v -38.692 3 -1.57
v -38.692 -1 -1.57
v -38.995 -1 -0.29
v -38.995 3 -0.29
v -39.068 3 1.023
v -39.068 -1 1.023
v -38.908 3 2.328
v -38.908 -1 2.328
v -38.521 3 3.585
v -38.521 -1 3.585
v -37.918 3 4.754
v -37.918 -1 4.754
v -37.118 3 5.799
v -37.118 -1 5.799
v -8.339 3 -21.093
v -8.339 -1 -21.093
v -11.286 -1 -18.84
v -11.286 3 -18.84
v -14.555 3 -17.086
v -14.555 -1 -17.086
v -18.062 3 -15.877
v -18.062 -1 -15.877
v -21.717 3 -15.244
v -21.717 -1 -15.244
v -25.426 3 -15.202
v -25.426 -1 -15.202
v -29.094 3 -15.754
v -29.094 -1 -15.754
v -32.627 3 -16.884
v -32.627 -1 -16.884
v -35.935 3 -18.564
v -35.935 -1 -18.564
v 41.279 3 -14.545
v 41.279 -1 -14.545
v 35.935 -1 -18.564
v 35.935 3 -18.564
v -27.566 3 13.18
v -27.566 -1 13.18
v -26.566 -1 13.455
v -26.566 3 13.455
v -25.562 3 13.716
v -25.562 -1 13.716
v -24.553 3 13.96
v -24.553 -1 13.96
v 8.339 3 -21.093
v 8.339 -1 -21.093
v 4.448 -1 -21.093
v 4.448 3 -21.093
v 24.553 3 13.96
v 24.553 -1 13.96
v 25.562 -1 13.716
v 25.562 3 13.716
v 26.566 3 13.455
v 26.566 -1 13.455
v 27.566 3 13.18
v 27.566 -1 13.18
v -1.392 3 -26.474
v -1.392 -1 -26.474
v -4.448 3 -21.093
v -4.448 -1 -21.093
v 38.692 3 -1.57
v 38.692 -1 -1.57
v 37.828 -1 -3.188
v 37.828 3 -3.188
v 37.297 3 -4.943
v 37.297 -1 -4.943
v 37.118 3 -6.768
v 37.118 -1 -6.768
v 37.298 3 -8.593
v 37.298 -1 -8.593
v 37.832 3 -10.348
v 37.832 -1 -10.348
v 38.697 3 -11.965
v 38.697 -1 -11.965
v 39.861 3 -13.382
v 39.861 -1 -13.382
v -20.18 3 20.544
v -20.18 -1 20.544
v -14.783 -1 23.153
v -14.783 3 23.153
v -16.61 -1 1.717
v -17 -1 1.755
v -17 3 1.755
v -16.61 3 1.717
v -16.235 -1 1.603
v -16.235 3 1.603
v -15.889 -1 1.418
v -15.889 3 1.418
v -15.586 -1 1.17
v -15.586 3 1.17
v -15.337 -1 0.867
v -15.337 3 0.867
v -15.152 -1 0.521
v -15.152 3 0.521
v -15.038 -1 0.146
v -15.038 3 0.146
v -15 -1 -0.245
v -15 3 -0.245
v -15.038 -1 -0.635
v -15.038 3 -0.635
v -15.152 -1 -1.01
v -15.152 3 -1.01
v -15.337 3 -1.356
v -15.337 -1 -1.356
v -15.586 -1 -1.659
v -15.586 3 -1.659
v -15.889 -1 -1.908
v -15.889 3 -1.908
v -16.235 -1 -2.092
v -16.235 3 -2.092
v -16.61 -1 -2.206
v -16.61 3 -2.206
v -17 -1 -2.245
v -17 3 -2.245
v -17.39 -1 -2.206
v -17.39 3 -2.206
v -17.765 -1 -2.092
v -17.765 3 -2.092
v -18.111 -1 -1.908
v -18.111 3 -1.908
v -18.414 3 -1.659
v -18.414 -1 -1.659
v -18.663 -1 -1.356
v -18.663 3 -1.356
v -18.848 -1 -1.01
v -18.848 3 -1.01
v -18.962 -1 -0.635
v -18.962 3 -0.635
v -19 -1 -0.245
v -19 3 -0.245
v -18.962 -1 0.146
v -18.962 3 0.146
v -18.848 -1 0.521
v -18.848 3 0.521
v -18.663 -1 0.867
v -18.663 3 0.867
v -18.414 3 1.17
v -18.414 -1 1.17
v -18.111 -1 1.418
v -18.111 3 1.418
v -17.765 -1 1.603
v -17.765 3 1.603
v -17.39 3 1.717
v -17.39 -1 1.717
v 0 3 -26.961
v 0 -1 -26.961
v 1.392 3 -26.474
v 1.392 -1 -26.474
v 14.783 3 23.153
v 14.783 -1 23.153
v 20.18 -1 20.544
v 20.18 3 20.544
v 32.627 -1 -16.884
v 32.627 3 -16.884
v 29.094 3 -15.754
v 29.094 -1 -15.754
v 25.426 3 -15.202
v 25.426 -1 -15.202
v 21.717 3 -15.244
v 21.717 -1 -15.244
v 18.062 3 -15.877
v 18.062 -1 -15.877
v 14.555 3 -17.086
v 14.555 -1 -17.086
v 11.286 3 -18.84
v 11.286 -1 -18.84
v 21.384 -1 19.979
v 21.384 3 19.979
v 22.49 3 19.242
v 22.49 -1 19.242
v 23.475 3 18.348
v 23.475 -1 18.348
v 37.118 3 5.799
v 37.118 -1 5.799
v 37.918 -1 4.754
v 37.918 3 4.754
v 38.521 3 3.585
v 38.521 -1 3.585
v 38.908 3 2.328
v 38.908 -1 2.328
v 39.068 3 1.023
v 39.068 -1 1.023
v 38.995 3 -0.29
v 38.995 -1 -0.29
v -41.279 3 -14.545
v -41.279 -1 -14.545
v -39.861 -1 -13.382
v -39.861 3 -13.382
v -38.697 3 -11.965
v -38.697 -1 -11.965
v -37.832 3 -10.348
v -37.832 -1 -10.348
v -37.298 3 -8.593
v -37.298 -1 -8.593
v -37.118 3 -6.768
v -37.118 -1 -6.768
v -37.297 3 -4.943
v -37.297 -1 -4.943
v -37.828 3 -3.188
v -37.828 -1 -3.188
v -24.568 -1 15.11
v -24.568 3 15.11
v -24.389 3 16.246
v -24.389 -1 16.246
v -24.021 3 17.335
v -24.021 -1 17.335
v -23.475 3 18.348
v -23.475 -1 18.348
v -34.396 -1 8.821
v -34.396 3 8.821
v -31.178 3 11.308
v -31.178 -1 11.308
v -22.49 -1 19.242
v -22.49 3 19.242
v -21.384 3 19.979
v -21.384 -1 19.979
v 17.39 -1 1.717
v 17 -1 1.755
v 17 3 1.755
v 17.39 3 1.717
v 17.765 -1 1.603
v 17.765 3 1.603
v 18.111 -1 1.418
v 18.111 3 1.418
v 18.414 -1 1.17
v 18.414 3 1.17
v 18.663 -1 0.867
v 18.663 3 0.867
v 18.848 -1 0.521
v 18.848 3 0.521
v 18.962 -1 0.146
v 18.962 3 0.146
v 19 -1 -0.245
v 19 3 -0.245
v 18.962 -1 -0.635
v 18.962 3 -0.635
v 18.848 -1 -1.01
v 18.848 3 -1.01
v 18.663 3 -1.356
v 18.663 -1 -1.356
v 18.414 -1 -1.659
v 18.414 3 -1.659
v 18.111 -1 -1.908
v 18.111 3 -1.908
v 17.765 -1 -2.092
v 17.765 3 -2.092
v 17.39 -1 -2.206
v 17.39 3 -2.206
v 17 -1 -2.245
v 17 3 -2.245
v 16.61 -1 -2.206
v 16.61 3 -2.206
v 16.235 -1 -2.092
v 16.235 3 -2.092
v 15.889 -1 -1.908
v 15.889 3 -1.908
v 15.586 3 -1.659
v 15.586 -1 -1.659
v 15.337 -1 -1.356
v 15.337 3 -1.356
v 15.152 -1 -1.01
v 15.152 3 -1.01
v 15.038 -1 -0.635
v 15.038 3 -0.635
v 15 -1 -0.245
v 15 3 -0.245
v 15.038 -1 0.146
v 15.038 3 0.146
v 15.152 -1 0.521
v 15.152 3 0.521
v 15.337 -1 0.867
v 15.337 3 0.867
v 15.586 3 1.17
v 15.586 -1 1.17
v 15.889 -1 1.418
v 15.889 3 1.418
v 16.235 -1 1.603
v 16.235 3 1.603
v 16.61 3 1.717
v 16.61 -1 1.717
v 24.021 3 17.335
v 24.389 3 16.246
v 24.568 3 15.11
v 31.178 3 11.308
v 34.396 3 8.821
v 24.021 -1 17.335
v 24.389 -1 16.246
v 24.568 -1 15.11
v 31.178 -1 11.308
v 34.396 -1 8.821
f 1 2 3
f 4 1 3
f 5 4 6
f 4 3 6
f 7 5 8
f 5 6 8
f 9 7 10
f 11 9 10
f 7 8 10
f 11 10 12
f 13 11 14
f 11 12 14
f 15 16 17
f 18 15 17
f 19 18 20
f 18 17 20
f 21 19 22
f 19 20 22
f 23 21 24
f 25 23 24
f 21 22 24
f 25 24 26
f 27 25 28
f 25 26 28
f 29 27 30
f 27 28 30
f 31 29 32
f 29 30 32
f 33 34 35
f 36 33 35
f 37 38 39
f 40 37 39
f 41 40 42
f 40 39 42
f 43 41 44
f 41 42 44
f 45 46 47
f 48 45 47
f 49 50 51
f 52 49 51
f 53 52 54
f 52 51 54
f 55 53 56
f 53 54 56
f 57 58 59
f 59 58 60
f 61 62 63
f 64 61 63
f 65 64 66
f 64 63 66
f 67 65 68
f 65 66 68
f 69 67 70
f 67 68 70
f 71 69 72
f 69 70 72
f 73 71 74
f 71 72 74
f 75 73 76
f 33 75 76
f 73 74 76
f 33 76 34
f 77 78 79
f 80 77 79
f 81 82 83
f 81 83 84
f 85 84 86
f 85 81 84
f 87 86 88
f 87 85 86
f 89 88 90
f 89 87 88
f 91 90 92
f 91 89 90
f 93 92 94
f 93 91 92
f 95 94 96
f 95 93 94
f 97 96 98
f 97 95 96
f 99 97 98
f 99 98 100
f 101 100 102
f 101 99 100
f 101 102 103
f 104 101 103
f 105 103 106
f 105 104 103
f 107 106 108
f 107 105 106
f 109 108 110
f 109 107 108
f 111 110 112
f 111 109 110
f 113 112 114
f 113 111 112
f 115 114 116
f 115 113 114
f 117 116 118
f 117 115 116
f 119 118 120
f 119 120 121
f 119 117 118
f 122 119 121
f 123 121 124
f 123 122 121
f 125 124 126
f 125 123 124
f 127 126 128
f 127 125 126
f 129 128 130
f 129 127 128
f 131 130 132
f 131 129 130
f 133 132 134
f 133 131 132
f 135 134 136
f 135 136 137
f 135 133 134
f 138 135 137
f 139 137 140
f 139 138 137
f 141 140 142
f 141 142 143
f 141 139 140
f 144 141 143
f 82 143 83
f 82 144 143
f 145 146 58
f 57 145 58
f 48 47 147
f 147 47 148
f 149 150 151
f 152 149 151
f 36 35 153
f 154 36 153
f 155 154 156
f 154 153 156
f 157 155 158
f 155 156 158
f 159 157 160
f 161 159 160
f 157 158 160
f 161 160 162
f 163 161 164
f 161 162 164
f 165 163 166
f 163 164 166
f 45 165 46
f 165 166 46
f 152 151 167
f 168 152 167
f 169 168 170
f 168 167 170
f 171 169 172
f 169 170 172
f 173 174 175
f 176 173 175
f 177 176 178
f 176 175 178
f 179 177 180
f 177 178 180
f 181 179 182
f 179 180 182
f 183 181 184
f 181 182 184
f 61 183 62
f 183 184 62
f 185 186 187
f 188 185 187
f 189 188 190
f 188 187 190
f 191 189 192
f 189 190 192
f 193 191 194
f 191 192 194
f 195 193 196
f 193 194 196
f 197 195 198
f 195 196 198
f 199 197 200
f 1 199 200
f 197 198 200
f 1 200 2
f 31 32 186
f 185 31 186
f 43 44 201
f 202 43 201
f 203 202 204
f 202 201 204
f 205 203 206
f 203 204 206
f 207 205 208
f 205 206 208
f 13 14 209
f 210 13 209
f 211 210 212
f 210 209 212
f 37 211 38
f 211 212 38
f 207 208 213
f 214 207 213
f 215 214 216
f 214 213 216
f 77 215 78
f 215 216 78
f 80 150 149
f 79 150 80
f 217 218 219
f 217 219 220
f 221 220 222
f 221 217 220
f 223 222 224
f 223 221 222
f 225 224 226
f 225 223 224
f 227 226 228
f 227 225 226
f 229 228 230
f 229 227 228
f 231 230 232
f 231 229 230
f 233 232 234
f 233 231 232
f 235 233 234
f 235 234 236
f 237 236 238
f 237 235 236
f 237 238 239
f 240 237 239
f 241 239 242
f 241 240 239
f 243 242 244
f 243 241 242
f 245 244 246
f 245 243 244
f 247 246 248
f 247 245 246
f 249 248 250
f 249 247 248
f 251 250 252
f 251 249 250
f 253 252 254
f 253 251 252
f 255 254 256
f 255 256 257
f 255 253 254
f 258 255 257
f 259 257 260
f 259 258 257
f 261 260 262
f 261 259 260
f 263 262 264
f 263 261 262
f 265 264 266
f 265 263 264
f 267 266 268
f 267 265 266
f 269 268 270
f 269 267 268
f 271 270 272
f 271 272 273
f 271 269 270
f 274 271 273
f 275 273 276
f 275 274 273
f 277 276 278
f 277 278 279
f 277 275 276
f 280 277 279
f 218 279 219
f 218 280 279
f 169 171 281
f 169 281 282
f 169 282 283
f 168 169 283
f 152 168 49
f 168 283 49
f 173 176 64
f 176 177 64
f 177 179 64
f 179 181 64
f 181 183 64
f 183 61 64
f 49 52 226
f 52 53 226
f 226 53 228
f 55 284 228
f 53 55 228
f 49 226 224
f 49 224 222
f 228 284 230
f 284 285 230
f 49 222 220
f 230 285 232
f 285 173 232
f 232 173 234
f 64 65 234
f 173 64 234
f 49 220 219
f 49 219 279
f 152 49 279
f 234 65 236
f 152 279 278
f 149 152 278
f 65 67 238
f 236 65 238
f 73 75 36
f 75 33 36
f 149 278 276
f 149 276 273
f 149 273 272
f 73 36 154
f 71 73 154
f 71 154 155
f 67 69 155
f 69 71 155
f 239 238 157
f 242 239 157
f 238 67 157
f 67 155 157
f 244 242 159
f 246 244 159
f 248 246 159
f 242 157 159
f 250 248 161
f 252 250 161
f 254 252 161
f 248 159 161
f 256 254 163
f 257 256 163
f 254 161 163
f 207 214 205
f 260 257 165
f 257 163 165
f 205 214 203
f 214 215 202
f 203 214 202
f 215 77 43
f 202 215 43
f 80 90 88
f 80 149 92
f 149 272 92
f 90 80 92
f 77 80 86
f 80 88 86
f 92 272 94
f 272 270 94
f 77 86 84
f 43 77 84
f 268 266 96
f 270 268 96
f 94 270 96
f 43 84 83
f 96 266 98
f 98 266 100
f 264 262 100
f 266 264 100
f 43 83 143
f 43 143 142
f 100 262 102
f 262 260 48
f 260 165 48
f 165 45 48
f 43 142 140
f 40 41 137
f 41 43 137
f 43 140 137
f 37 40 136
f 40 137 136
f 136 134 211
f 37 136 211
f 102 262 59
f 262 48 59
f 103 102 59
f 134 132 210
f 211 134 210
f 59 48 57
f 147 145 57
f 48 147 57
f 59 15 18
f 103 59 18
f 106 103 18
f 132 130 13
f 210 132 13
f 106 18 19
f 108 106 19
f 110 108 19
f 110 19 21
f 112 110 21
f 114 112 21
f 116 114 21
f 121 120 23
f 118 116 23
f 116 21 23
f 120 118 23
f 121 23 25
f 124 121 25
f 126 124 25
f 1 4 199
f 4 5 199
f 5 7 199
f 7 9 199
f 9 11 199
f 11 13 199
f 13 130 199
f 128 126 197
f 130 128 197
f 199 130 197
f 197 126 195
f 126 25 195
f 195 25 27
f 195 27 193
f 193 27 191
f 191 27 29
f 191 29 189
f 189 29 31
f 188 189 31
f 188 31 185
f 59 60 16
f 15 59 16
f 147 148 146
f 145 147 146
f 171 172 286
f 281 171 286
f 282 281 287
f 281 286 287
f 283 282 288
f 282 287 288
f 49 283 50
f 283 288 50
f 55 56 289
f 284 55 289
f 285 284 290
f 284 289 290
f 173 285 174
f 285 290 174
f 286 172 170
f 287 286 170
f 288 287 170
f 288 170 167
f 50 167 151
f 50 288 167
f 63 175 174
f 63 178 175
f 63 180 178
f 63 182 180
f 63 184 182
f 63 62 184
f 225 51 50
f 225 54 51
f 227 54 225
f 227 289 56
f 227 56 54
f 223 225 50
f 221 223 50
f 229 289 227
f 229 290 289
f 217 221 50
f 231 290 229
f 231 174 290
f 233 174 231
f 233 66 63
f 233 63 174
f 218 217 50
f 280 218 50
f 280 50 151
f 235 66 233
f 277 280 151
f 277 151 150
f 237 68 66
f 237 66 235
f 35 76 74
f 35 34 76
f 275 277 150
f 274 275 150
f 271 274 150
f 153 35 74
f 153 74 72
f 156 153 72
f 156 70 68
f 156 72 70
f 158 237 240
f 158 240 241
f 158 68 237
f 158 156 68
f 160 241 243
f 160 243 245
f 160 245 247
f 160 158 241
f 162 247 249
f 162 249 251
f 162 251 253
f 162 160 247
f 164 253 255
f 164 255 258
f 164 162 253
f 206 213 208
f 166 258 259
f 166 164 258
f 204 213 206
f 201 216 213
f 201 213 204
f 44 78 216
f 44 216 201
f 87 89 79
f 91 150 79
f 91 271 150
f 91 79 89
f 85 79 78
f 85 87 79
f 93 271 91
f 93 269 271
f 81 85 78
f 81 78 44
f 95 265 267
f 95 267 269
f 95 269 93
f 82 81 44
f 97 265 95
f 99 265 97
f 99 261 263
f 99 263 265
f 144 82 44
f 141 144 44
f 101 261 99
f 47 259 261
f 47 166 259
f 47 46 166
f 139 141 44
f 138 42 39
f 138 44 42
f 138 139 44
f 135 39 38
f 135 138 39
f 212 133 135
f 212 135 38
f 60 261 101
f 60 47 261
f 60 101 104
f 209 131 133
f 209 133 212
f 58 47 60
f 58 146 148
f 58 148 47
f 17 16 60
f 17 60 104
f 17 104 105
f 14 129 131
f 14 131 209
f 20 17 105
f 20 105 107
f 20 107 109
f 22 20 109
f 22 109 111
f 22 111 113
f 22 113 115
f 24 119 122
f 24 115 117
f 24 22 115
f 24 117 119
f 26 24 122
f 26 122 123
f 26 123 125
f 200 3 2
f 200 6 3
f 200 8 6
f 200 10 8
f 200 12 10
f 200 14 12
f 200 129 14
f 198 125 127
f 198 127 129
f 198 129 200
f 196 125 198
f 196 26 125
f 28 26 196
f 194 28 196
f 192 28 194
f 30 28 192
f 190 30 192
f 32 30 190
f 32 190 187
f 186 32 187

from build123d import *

# Parameters (mm, degrees)
SKETCH2_R           = 1
BOSS_EXTRUDE1_DEPTH = 2
SCALE1_SCALE        = 2


with BuildPart() as part:
    # Sketch2 → Boss-Extrude1 (new body)
    # profile 1 of 4: a face of its own
    with BuildSketch(Plane(origin=(0, 0, 0), x_dir=(1, 0, 0), z_dir=(0, 1, 0))):
        with BuildLine():
            Line((-1.534348462, -5.637537028), (1.534348462, -5.637537028))
            ThreePointArc((1.534348462, -5.637537028), (4.324823338, -6.236497301), (6.623693303, -7.927857797))
            ThreePointArc((6.623693303, -7.927857797), (10.236440266, -7.514468852), (13.78312899, -6.712078584))
            ThreePointArc((13.78312899, -6.712078584), (16.421478173, -5.190969631), (18.558961711, -3.021678736))
            ThreePointArc((18.558961711, -3.021678736), (19.45411943, -1.286546543), (19.346117765, 0.662896123))
            ThreePointArc((19.346117765, 0.662896123), (18.649238809, 4.17439457), (20.639475337, 7.15016677))
            Line((20.639475337, 7.15016677), (17.967387551, 9.159795774))
            ThreePointArc((17.967387551, 9.159795774), (10.858325227, 7.499674132), (4.169484372, 10.424426945))
            Line((4.169484372, 10.424426945), (-4.169484372, 10.424426945))
            ThreePointArc((-4.169484372, 10.424426945), (-10.858325227, 7.499674132), (-17.967387551, 9.159795774))
            Line((-17.967387551, 9.159795774), (-20.639475337, 7.15016677))
            ThreePointArc((-20.639475337, 7.15016677), (-18.649238809, 4.17439457), (-19.346117765, 0.662896123))
            ThreePointArc((-19.346117765, 0.662896123), (-19.45411943, -1.286546543), (-18.558961711, -3.021678736))
            ThreePointArc((-18.558961711, -3.021678736), (-16.421478173, -5.190969631), (-13.78312899, -6.712078584))
            ThreePointArc((-13.78312899, -6.712078584), (-10.236440266, -7.514468852), (-6.623693303, -7.927857797))
            ThreePointArc((-6.623693303, -7.927857797), (-4.324823338, -6.236497301), (-1.534348462, -5.637537028))
        make_face()
        with Locations(Location((-8.5, 0, 0), (0, 0, 270))):
            Circle(SKETCH2_R, mode=Mode.SUBTRACT)
        with Locations(Location((8.5, 0, 0), (0, 0, 270))):
            Circle(SKETCH2_R, mode=Mode.SUBTRACT)
    # profile 2 of 4: a face of its own
    with BuildSketch(Plane(origin=(0, 0, 0), x_dir=(1, 0, 0), z_dir=(0, 1, 0))):
        Polygon((-0.696104526, 13.114793475), (-2.224138848, 10.424426945), (2.224138848, 10.424426945), (0.696104526, 13.114793475), (0, 13.358013588), align=None)
    # profile 3 of 4: a face of its own
    with BuildSketch(Plane(origin=(0, 0, 0), x_dir=(1, 0, 0), z_dir=(0, 1, 0))):
        with BuildLine():
            ThreePointArc((-12.276686285, -7.102440046), (-12.194265553, -8.245293076), (-11.737308023, -9.296052821))
            ThreePointArc((-11.737308023, -9.296052821), (-10.975506649, -9.937799505), (-10.090124565, -10.394175126))
            Line((-10.090124565, -10.394175126), (-7.391598262, -11.698651137))
            Line((-7.391598262, -11.698651137), (-0.775741109, -11.143020661))
            Line((-0.775741109, -11.143020661), (0, -10.959524643))
            Line((0, -10.959524643), (0.775741109, -11.143020661))
            Line((0.775741109, -11.143020661), (7.391598262, -11.698651137))
            Line((7.391598262, -11.698651137), (10.090124565, -10.394175126))
            ThreePointArc((10.090124565, -10.394175126), (10.975506649, -9.937799505), (11.737308023, -9.296052821))
            ThreePointArc((11.737308023, -9.296052821), (12.194265553, -8.245293076), (12.276686285, -7.102440046))
            ThreePointArc((12.276686285, -7.102440046), (9.46781094, -7.635829891), (6.623693303, -7.927857797))
            ThreePointArc((6.623693303, -7.927857797), (4.324823338, -6.236497301), (1.534348462, -5.637537028))
            Line((1.534348462, -5.637537028), (-1.534348462, -5.637537028))
            ThreePointArc((-1.534348462, -5.637537028), (-4.324823338, -6.236497301), (-6.623693303, -7.927857797))
            ThreePointArc((-6.623693303, -7.927857797), (-9.46781094, -7.635829891), (-12.276686285, -7.102440046))
        make_face()
    # profile 4 of 4: a face of its own
    with BuildSketch(Plane(origin=(0, 0, 0), x_dir=(1, 0, 0), z_dir=(0, 1, 0))):
        Polygon((-7.391598262, -11.698651137), (-0.775741109, -11.143020661), (0, -10.959524643), (0.775741109, -11.143020661), (7.391598262, -11.698651137), align=None)
    extrude(amount=BOSS_EXTRUDE1_DEPTH)


with BuildPart() as part_1:
    # Scale1: scaled about (0, 1, 0.244603094)
    add(part.part.scale(SCALE1_SCALE).moved(Location((0, -1, -0.244603094))))


solid = part_1.part
